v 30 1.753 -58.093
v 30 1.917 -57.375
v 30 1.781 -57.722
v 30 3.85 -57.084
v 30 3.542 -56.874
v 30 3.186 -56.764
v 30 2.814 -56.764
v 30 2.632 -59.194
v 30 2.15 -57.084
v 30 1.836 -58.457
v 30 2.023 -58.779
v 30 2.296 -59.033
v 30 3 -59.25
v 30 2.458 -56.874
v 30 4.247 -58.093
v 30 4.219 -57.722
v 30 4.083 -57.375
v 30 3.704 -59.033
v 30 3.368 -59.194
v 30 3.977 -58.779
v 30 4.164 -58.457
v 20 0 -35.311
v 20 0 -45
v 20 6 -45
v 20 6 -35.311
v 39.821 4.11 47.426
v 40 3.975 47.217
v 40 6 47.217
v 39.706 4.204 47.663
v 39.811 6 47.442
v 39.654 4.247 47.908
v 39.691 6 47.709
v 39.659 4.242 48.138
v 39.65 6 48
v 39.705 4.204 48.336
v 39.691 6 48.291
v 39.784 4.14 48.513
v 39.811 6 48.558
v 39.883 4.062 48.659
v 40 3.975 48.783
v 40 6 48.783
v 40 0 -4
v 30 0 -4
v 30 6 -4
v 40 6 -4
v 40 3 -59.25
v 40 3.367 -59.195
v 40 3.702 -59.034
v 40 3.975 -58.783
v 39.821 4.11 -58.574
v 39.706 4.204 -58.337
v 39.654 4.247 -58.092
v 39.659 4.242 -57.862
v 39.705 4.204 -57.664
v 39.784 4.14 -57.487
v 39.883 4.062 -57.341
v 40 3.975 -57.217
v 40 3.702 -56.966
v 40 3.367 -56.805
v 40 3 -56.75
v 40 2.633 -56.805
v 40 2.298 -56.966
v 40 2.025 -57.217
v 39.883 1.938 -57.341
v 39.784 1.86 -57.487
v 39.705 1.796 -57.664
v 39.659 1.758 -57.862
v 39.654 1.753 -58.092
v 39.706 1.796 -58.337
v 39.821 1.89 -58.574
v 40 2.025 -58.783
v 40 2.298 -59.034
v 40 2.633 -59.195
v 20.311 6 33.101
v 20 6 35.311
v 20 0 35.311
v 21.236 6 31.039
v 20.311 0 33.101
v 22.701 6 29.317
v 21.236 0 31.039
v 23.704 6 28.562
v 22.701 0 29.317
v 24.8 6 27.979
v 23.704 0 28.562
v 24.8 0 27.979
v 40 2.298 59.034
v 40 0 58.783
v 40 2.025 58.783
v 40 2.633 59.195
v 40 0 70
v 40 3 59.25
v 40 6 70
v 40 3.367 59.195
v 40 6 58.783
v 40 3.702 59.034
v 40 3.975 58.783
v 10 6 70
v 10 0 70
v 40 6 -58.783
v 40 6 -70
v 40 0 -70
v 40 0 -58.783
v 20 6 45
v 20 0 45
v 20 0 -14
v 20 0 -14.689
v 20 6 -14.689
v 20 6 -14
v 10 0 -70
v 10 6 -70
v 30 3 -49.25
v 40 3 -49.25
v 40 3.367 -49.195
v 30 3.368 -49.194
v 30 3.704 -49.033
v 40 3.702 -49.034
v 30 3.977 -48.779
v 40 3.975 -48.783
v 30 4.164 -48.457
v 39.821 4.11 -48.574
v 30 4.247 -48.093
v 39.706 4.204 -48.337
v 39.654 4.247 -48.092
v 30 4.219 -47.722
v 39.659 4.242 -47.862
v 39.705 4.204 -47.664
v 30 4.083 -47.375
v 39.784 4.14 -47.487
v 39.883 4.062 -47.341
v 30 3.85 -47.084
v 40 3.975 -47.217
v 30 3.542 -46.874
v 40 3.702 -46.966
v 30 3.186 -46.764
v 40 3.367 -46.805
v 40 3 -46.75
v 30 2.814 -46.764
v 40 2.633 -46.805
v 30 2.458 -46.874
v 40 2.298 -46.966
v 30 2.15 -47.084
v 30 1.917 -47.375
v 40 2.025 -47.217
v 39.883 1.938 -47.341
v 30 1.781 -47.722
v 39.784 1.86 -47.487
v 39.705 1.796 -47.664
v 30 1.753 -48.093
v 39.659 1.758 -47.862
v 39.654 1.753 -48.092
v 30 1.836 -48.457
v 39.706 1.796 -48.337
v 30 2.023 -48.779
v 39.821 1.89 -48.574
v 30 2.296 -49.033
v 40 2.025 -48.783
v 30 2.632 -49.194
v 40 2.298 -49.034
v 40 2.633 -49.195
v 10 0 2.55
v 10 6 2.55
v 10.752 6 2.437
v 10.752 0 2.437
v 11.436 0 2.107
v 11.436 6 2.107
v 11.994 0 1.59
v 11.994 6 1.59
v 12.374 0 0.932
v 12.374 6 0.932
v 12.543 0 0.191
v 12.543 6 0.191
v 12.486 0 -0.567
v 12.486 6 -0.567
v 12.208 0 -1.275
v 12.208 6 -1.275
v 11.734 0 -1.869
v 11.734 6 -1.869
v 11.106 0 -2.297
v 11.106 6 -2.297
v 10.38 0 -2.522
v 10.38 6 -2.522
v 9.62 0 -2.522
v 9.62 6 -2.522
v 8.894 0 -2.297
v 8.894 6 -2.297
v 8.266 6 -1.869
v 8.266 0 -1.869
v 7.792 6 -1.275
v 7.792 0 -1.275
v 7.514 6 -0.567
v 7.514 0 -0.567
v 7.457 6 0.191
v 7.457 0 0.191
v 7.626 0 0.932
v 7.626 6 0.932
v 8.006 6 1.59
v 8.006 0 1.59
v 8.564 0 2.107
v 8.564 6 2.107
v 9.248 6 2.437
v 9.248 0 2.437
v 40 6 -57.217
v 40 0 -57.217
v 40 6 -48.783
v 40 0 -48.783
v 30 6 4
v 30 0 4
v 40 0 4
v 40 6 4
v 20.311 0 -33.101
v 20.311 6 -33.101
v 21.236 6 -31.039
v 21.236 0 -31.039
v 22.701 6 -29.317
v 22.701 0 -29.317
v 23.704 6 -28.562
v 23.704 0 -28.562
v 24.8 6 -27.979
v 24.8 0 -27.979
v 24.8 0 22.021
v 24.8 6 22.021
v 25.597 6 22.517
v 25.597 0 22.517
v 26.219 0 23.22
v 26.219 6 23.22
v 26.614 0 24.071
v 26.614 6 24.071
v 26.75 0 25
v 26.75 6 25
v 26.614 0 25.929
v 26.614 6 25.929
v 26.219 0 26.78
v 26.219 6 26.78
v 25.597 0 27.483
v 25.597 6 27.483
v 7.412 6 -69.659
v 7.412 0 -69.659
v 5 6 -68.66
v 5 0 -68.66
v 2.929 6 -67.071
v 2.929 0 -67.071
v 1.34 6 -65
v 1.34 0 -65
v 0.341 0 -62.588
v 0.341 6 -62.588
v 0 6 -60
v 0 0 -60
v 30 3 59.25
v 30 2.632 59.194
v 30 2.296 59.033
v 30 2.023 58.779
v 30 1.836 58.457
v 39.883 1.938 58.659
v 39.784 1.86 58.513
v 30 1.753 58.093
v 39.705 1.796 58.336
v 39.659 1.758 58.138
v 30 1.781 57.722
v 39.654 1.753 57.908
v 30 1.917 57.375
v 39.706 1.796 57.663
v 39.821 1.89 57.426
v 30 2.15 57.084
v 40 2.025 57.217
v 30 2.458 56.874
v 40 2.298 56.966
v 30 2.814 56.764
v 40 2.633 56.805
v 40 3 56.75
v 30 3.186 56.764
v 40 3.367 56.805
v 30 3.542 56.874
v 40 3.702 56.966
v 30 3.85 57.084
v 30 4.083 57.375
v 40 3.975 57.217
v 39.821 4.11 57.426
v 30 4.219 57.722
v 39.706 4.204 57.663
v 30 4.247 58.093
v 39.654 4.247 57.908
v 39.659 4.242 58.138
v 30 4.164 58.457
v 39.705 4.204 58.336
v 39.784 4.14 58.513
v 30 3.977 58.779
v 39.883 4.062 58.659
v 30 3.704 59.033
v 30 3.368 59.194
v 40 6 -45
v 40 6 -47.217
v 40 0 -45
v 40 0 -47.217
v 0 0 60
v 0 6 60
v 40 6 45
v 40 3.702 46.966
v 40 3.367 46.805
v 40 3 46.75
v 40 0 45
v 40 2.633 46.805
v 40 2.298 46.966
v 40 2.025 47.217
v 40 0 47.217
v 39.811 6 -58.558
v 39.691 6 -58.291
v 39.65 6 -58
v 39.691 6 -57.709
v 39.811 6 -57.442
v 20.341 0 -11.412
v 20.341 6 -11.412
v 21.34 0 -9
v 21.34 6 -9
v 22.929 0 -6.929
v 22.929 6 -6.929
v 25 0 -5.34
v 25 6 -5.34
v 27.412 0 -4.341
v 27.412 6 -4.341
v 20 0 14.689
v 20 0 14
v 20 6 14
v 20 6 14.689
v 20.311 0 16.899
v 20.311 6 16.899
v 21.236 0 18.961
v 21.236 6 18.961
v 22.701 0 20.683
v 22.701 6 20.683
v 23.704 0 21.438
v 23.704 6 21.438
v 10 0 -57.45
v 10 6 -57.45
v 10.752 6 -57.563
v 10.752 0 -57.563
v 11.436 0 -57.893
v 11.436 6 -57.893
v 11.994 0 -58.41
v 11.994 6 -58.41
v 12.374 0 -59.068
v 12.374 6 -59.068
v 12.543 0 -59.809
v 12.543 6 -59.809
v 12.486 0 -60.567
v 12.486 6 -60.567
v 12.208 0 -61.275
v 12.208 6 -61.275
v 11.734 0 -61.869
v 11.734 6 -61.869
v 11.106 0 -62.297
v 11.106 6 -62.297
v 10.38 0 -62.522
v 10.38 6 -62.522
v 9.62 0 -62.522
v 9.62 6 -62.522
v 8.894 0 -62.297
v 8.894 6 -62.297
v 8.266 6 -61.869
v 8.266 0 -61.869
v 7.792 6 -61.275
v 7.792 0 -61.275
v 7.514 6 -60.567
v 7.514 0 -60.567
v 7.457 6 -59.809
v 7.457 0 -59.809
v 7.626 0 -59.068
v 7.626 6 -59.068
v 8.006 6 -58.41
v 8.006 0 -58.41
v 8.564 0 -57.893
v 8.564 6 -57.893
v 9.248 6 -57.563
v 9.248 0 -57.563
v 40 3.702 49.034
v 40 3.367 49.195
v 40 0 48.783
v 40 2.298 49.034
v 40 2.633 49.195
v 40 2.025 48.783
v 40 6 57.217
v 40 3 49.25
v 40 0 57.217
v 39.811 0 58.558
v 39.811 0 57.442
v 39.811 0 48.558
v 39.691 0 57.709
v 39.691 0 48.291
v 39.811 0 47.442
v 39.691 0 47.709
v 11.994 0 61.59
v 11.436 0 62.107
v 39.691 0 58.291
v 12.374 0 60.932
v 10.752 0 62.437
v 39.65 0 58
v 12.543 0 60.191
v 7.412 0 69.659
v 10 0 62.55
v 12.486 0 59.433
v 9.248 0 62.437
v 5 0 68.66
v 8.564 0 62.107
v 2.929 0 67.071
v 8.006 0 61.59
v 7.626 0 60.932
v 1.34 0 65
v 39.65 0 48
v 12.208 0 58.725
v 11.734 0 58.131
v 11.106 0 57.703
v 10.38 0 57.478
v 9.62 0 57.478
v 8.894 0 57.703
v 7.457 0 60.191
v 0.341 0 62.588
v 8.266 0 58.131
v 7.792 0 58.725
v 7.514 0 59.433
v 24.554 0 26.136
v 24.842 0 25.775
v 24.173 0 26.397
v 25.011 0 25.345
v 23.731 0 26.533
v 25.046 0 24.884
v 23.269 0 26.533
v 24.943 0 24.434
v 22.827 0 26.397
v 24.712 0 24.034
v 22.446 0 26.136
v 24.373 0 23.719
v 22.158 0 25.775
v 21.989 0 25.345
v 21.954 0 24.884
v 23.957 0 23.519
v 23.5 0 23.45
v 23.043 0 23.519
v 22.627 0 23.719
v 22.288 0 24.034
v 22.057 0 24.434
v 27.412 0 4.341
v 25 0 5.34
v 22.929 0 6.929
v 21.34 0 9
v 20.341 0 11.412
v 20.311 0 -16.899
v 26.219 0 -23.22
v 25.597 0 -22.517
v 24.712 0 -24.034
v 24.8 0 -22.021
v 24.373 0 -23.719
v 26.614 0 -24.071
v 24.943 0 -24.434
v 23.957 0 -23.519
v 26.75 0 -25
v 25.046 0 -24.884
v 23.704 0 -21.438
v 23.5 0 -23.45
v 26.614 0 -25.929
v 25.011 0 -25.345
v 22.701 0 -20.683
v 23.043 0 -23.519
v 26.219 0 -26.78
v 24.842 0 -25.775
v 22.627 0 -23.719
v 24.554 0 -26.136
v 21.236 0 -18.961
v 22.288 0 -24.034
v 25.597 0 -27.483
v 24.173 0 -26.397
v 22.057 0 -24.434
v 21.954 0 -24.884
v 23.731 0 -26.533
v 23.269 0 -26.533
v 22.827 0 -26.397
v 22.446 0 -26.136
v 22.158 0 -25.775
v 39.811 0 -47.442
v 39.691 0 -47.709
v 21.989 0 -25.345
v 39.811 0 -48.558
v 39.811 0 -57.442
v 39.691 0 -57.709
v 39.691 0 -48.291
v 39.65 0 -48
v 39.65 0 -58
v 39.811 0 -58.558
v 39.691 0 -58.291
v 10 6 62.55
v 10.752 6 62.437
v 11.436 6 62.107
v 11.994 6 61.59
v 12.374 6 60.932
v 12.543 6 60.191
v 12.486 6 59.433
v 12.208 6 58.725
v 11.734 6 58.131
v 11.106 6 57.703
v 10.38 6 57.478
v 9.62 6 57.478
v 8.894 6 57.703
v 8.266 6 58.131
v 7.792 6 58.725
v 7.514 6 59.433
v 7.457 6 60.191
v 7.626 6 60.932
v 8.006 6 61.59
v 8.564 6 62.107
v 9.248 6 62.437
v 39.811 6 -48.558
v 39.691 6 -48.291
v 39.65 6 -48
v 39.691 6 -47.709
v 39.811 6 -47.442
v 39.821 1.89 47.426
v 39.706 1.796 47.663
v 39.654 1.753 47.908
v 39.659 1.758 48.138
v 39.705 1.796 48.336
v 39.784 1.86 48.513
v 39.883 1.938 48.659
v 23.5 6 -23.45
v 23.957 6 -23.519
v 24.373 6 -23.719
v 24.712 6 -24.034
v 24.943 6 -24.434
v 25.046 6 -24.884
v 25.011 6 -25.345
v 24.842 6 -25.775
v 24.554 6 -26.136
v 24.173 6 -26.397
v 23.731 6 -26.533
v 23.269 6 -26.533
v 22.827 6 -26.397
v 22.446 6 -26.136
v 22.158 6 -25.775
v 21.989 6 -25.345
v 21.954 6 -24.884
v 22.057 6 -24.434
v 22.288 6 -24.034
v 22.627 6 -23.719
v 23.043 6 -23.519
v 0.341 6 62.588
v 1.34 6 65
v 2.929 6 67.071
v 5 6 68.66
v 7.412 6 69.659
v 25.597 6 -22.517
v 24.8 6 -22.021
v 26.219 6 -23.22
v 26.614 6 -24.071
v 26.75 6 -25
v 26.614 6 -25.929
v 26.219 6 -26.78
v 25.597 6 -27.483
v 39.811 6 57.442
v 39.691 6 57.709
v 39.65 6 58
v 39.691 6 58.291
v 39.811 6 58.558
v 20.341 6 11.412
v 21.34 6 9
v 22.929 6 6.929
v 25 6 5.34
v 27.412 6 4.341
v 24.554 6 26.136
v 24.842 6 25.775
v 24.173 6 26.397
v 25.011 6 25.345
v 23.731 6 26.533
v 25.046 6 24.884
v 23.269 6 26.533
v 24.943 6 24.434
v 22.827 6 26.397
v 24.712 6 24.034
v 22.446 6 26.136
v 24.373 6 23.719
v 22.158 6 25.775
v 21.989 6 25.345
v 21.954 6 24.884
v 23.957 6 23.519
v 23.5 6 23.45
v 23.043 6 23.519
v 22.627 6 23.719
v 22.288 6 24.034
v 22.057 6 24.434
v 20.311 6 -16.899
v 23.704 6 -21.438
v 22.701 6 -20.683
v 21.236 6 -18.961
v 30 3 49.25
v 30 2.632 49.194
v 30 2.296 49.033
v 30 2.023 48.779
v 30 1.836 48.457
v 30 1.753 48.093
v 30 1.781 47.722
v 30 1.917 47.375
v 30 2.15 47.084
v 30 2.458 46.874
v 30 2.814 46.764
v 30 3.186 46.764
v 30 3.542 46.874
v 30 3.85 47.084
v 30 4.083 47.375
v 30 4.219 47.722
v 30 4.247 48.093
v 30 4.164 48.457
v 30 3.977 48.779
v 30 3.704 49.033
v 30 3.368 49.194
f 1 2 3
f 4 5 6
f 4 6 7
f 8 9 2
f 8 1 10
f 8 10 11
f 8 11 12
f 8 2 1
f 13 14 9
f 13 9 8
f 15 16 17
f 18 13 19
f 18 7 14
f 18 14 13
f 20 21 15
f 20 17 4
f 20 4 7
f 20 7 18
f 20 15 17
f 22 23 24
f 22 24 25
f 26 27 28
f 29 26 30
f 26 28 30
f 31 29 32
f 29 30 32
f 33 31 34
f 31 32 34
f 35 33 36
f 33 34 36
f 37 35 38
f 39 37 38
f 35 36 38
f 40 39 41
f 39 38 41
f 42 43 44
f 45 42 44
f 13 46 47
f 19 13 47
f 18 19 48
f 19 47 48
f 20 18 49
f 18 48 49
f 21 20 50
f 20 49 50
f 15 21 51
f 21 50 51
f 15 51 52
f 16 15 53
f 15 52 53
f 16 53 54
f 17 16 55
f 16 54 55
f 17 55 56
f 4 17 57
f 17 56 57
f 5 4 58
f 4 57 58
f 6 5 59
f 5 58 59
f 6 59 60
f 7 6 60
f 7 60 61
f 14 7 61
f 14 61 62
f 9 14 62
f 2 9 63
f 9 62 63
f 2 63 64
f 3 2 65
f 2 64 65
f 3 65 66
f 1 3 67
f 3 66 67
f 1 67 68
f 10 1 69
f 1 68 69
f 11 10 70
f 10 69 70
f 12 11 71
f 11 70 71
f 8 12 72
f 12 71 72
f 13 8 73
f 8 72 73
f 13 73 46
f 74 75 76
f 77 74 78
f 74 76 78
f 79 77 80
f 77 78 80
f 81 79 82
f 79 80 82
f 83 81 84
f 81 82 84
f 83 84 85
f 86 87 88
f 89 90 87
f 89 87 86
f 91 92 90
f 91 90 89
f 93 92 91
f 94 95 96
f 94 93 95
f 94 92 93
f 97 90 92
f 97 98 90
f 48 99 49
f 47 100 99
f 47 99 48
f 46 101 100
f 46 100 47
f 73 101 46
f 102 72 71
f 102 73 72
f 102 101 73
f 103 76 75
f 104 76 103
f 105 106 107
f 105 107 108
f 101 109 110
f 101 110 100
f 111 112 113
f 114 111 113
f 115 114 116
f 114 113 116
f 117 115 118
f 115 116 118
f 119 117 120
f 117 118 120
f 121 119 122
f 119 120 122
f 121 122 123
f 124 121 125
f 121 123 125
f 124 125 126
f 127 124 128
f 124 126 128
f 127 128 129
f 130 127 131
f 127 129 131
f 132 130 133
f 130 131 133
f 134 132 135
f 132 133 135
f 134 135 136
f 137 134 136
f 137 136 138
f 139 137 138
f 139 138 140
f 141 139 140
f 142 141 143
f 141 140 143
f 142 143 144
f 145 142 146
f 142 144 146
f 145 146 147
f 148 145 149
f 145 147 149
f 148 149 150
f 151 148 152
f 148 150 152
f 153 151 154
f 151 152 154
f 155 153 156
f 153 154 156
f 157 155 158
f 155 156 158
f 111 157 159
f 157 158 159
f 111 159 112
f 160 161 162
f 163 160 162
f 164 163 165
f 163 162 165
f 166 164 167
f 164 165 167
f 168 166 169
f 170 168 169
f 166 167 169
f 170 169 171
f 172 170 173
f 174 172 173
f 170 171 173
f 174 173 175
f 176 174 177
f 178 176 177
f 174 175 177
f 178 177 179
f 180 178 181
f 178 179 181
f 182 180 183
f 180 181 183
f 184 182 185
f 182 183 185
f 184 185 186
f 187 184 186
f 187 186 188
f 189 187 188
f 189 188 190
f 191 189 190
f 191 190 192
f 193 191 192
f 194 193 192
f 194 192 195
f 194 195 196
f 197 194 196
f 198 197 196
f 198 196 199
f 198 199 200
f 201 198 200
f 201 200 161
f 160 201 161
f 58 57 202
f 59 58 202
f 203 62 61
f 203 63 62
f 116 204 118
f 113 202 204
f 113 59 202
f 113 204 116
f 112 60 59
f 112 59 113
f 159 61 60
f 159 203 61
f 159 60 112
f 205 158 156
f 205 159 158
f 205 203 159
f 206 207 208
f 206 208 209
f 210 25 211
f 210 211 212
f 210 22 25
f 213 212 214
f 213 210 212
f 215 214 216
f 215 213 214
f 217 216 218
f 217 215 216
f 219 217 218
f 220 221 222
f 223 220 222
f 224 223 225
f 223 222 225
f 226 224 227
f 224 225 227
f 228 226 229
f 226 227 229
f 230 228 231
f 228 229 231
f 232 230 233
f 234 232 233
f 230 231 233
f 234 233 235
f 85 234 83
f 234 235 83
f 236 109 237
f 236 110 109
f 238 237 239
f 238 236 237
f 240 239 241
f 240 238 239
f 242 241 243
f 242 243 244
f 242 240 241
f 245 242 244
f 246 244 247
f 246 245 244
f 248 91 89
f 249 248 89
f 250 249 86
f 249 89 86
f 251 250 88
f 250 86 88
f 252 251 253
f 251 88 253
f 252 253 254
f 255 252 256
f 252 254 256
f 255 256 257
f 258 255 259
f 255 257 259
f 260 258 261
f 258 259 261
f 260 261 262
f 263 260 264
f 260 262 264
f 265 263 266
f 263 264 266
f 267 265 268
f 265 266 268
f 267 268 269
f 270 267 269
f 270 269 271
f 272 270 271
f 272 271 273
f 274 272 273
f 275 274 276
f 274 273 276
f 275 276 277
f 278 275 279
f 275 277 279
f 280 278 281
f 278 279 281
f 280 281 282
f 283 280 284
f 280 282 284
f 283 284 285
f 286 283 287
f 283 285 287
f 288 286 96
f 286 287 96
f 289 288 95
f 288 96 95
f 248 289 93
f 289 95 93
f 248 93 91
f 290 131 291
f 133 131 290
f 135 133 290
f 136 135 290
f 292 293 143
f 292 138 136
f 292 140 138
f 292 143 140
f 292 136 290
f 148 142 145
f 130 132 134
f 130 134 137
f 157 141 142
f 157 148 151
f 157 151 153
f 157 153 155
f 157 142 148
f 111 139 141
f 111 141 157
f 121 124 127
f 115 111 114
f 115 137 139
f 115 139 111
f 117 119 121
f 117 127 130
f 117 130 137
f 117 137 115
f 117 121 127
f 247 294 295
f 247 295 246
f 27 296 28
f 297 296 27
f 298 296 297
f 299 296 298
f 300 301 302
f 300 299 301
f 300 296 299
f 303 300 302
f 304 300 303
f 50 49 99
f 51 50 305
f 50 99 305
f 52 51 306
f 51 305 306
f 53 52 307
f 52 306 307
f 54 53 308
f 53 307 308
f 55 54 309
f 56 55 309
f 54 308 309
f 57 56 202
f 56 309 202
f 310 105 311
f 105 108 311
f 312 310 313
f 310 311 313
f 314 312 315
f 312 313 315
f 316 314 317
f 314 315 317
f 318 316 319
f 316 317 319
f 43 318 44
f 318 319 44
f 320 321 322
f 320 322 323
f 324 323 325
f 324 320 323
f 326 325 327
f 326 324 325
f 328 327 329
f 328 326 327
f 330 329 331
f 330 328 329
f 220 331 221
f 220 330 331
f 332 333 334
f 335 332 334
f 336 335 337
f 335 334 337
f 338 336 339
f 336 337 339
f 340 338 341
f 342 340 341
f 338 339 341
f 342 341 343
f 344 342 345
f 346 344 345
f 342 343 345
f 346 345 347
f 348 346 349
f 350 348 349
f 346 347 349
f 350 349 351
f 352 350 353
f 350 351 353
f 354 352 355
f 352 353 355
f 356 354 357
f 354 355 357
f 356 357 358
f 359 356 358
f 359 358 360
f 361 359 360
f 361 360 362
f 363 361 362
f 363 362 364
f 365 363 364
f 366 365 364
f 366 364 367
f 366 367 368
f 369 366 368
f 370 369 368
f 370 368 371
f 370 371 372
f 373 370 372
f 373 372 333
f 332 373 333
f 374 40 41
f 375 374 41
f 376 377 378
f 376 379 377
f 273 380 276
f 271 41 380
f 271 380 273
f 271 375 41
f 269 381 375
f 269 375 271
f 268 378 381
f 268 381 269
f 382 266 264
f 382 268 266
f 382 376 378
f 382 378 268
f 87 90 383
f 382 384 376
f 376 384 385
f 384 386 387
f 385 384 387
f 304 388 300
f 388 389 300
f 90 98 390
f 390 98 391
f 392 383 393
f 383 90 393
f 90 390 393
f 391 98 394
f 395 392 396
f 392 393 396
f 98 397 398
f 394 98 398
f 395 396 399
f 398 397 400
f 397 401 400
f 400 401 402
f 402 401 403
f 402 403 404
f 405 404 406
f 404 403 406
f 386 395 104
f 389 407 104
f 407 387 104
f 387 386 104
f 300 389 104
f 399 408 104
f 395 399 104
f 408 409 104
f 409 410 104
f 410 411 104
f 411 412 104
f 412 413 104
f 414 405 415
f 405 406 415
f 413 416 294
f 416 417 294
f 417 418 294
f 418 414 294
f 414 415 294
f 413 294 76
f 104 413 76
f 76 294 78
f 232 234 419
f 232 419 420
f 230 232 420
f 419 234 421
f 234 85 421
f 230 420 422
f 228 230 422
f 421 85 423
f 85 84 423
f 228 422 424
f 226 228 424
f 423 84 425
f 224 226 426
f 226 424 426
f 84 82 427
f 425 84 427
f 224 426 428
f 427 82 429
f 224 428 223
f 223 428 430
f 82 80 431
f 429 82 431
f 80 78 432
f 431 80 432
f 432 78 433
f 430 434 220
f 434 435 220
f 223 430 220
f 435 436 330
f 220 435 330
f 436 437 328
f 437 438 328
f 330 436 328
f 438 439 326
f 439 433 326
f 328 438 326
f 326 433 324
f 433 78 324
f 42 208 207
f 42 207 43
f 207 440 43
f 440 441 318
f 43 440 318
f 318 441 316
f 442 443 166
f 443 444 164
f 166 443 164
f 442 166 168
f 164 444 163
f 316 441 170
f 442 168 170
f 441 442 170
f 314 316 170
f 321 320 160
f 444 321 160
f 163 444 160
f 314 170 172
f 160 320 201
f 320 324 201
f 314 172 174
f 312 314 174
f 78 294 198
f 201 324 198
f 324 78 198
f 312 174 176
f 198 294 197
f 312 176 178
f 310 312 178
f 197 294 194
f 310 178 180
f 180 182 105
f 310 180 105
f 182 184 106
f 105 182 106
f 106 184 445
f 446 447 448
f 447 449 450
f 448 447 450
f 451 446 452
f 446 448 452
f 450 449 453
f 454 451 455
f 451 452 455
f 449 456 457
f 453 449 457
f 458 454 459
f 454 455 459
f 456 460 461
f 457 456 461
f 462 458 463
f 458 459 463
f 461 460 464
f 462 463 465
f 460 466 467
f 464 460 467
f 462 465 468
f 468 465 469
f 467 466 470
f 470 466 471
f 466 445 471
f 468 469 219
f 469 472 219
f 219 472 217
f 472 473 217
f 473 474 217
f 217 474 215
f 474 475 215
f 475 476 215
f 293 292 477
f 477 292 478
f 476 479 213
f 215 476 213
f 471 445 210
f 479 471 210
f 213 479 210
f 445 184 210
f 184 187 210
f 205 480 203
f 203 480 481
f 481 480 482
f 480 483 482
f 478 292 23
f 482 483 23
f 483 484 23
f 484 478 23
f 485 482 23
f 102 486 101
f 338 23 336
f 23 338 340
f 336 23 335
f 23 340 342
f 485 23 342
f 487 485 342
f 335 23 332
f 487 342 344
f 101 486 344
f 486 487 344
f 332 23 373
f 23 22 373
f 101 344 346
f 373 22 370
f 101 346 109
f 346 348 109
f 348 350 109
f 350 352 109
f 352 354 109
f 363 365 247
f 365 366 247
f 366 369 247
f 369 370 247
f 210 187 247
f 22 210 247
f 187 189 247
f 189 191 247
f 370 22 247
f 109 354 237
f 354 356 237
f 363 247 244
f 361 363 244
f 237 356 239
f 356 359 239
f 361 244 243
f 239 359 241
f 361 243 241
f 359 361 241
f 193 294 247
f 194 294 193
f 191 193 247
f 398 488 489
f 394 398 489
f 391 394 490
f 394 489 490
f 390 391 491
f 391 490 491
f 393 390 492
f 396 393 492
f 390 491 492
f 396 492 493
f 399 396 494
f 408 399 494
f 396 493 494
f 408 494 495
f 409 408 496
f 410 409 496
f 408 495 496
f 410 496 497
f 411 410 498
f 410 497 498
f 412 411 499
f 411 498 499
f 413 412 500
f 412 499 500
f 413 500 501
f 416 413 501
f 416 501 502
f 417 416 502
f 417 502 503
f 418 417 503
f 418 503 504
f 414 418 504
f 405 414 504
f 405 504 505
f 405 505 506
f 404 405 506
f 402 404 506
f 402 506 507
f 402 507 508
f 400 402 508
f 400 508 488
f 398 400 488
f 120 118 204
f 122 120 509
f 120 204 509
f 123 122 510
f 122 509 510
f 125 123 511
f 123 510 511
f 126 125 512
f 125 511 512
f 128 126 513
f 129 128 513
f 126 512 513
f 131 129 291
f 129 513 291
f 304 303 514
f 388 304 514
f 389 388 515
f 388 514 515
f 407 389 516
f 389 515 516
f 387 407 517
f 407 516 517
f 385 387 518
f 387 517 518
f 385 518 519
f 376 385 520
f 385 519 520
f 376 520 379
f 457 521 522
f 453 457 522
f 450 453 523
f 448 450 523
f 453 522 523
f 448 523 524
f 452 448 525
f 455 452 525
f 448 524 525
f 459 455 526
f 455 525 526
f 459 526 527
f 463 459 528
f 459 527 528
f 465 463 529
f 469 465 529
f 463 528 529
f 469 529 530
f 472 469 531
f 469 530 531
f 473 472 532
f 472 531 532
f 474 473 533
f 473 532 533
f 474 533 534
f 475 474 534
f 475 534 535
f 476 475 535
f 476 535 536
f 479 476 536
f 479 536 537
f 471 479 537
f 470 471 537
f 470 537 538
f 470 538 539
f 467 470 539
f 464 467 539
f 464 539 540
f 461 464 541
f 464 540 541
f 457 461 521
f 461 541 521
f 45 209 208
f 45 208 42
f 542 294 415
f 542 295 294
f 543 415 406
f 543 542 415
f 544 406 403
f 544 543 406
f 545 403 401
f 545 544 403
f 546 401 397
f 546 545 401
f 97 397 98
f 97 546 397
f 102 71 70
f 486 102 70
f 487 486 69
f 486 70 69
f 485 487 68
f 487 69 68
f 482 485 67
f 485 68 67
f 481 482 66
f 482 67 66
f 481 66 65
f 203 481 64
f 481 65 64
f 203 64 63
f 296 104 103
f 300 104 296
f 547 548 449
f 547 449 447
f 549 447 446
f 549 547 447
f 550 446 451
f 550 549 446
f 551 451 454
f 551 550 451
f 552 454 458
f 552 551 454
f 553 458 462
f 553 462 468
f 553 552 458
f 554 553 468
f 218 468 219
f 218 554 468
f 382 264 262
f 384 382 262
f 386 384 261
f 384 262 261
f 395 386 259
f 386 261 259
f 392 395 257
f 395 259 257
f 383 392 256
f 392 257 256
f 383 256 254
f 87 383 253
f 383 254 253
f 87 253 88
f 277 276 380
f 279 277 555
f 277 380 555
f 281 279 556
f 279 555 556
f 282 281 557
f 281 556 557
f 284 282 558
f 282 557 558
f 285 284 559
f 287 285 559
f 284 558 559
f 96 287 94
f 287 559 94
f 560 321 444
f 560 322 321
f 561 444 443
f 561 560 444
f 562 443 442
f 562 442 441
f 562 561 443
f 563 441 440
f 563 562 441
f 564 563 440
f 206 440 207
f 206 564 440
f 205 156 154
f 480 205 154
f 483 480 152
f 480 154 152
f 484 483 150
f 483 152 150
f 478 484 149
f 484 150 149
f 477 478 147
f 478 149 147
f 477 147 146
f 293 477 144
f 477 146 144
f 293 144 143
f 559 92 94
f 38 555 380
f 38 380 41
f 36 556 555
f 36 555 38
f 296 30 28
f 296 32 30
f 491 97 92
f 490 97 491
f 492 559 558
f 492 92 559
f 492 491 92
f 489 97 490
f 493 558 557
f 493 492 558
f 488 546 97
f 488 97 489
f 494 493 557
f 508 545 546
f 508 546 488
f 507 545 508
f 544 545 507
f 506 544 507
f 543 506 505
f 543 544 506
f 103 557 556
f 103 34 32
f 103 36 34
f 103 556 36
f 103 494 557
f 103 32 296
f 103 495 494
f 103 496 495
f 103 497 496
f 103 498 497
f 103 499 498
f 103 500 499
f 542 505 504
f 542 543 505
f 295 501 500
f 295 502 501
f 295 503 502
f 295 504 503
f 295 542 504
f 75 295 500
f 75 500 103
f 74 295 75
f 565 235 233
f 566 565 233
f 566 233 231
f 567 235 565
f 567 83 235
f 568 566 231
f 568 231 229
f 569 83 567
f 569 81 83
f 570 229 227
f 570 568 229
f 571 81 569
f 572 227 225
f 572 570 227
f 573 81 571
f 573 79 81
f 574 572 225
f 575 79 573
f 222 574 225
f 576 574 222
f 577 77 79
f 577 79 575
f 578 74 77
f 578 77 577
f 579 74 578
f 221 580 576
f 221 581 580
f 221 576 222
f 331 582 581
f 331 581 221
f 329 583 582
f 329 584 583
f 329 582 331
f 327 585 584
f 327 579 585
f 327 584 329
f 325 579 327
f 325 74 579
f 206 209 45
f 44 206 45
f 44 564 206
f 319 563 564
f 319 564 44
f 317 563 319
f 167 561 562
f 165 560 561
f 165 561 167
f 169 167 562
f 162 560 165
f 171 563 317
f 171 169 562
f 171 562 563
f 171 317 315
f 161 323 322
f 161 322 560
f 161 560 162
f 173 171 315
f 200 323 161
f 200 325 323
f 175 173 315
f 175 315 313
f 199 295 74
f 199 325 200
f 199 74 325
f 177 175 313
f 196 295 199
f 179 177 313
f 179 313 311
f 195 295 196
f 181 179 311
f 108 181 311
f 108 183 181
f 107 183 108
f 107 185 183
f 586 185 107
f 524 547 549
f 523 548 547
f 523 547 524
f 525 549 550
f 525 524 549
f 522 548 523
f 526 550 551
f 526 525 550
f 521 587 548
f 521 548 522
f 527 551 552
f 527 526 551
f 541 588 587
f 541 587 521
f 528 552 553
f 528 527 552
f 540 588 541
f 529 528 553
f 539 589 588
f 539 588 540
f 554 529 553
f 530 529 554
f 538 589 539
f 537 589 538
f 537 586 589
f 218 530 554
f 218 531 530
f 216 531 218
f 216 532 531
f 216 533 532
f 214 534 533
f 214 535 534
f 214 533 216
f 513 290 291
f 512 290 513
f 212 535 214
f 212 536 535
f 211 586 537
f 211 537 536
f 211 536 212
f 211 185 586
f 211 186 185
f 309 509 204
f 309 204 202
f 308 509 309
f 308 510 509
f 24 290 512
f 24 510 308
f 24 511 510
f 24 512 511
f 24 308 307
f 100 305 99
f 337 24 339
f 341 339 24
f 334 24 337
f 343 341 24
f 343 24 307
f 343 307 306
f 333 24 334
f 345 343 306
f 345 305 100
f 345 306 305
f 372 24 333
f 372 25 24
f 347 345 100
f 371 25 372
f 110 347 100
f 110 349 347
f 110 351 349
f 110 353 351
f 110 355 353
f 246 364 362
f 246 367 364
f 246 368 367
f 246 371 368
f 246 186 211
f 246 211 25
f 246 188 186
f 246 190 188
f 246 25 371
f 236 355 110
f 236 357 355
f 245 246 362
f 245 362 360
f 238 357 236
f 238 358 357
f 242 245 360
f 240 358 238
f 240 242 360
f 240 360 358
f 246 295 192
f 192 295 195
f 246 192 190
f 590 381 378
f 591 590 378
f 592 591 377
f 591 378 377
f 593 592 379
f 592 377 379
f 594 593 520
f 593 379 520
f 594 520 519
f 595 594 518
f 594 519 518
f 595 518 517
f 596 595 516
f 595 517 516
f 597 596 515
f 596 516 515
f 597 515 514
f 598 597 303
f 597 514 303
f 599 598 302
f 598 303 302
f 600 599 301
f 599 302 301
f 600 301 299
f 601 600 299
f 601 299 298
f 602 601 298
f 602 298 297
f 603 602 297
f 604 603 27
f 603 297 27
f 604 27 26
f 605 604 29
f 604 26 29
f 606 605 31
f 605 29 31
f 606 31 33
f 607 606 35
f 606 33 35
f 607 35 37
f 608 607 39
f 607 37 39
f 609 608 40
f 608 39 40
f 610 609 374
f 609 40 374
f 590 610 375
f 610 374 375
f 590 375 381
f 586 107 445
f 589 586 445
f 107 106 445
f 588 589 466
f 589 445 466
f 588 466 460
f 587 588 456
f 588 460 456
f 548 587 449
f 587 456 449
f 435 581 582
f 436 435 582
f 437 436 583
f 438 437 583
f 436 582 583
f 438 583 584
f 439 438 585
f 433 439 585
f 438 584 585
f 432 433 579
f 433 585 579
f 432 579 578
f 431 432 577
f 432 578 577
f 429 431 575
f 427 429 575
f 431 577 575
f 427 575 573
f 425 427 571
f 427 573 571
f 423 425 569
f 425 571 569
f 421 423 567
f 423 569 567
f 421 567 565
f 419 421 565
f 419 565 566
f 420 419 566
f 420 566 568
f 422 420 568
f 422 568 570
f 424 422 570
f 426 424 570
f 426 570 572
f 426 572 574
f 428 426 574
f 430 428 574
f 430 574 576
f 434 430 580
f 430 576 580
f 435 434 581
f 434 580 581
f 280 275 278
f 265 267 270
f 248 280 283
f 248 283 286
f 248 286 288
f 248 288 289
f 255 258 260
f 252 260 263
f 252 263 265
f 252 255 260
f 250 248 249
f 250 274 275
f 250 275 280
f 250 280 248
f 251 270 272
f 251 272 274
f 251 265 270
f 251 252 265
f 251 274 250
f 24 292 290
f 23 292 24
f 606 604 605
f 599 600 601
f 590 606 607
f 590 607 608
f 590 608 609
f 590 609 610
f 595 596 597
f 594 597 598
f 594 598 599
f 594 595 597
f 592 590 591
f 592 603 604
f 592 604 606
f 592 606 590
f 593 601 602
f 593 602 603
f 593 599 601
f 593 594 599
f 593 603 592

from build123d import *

# Parameters (mm, degrees)
EXTRUDE_1_DEPTH     = 6
SKETCH_2_R          = 1.25
CUT_EXTRUDE_1_DEPTH = 10
SKETCH_3_R          = 1.05
CUT_EXTRUDE_2_DEPTH = 81.845531726
SKETCH_4_R          = 2.55
CUT_EXTRUDE_3_DEPTH = 81.845531783
SKETCH_5_W          = 8
SKETCH_5_H          = 6
EXTRUDE_2_DEPTH     = 20
FILLET_2_R          = 10
FILLET_3_R          = 10
SKETCH_7_R          = 1.55
EXTRUDE_3_DEPTH     = 6
FILLET_4_R          = 8
SKETCH_9_W          = 9
SKETCH_9_H          = 6
EXTRUDE_4_DEPTH     = 3.5


with BuildPart() as part:
    # ｽｹｯﾁ1 → ﾎﾞｽ - 押し出し1 (new body)
    with BuildSketch(Plane(origin=(0, 0, 0), x_dir=(1, 0, 0), z_dir=(0, 1, 0))):
        Polygon((0, -70), (0, 70), (36.5, 70), (36.5, 61), (40, 61), (40, 45), (20, 45), (20, -45), (40, -45), (40, -61), (36.5, -61), (36.5, -70), align=None)
    extrude(amount=EXTRUDE_1_DEPTH)

    # ｽｹｯﾁ2 → ｶｯﾄ - 押し出し1 (cut)
    with BuildSketch(Plane(origin=(40, 0, 0), x_dir=(0, 0, -1), z_dir=(1, 0, 0))):
        with Locations((48, 3)):
            Circle(SKETCH_2_R)
        with Locations((58, 3)):
            Circle(SKETCH_2_R)
        with Locations(Location((-48, 3, 0), (0, 0, 180))):
            Circle(SKETCH_2_R)
        with Locations(Location((-58, 3, 0), (0, 0, 180))):
            Circle(SKETCH_2_R)
    extrude(amount=-CUT_EXTRUDE_1_DEPTH, mode=Mode.SUBTRACT)

    # ｽｹｯﾁ3 → ｶｯﾄ - 押し出し2 (cut, through all)
    with BuildSketch(Plane(origin=(0, 6, 0), x_dir=(1, 0, 0), z_dir=(0, 1, 0))):
        with Locations((40.7, 58)):
            Circle(SKETCH_3_R)
        with Locations((40.7, 48)):
            Circle(SKETCH_3_R)
        with Locations((40.7, -48)):
            Circle(SKETCH_3_R)
        with Locations((40.7, -58)):
            Circle(SKETCH_3_R)
    extrude(amount=-CUT_EXTRUDE_2_DEPTH, mode=Mode.SUBTRACT)

    # ｽｹｯﾁ4 → ｶｯﾄ - 押し出し3 (cut, through all)
    with BuildSketch(Plane(origin=(0, 6, 0), x_dir=(1, 0, 0), z_dir=(0, 1, 0))):
        with Locations(Location((10, 0, 0), (0, 0, 270))):
            Circle(SKETCH_4_R)
        with Locations(Location((10, 60, 0), (0, 0, 270))):
            Circle(SKETCH_4_R)
        with Locations(Location((10, -60, 0), (0, 0, 270))):
            Circle(SKETCH_4_R)
    extrude(amount=-CUT_EXTRUDE_3_DEPTH, mode=Mode.SUBTRACT)

    # ｽｹｯﾁ5 → ﾎﾞｽ - 押し出し2 (add)
    with BuildSketch(Plane(origin=(20, 0, 0), x_dir=(0, 0, -1), z_dir=(1, 0, 0))):
        with Locations((0, 3)):
            Rectangle(SKETCH_5_W, SKETCH_5_H)
    extrude(amount=EXTRUDE_2_DEPTH)

    # ﾌｨﾚｯﾄ2
    fillet_2_edges = [part.edges().sort_by_distance(p)[0] for p in [
        (20, 3, 4),
        (20, 3, -4),
    ]]
    fillet(fillet_2_edges, radius=FILLET_2_R)

    # ﾌｨﾚｯﾄ3
    fillet_3_edges = [part.edges().sort_by_distance(p)[0] for p in [
        (0, 3, 70),
        (0, 3, -70),
    ]]
    fillet(fillet_3_edges, radius=FILLET_3_R)

    # ｽｹｯﾁ7 → ﾎﾞｽ - 押し出し3 (add, through all)
    # profile 1 of 2: a face of its own
    with BuildSketch(Plane(origin=(0, 6, 0), x_dir=(1, 0, 0), z_dir=(0, 1, 0))):
        with BuildLine():
            Line((23.5, 28.25), (20, 28.25))
            Line((20, 28.25), (20, 21.75))
            Line((20, 21.75), (23.5, 21.75))
            ThreePointArc((23.5, 21.75), (26.75, 25), (23.5, 28.25))
        make_face()
        with Locations(Location((23.5, 25, 0), (0, 0, 270))):
            Circle(SKETCH_7_R, mode=Mode.SUBTRACT)
    # profile 2 of 2: a face of its own
    with BuildSketch(Plane(origin=(0, 6, 0), x_dir=(1, 0, 0), z_dir=(0, 1, 0))):
        with BuildLine():
            Line((20, -21.75), (23.5, -21.75))
            ThreePointArc((23.5, -21.75), (26.75, -25), (23.5, -28.25))
            Line((23.5, -28.25), (20, -28.25))
            Line((20, -28.25), (20, -21.75))
        make_face()
        with Locations(Location((23.5, -25, 0), (0, 0, 90))):
            Circle(SKETCH_7_R, mode=Mode.SUBTRACT)
    extrude(amount=-EXTRUDE_3_DEPTH)

    # ﾌｨﾚｯﾄ4
    fillet_4_edges = [part.edges().sort_by_distance(p)[0] for p in [
        (20, 3, 28.25),
        (20, 3, 21.75),
        (20, 3, -28.25),
        (20, 3, -21.75),
    ]]
    fillet(fillet_4_edges, radius=FILLET_4_R)

    # ｽｹｯﾁ9 → ﾎﾞｽ - 押し出し4 (add)
    with BuildSketch(Plane(origin=(36.5, 0, 0), x_dir=(0, 0, -1), z_dir=(1, 0, 0))):
        with Locations((-65.5, 3)):
            Rectangle(SKETCH_9_W, SKETCH_9_H)
        with Locations((65.5, 3)):
            Rectangle(SKETCH_9_W, SKETCH_9_H)
    extrude(amount=EXTRUDE_4_DEPTH)


solid = part.part
